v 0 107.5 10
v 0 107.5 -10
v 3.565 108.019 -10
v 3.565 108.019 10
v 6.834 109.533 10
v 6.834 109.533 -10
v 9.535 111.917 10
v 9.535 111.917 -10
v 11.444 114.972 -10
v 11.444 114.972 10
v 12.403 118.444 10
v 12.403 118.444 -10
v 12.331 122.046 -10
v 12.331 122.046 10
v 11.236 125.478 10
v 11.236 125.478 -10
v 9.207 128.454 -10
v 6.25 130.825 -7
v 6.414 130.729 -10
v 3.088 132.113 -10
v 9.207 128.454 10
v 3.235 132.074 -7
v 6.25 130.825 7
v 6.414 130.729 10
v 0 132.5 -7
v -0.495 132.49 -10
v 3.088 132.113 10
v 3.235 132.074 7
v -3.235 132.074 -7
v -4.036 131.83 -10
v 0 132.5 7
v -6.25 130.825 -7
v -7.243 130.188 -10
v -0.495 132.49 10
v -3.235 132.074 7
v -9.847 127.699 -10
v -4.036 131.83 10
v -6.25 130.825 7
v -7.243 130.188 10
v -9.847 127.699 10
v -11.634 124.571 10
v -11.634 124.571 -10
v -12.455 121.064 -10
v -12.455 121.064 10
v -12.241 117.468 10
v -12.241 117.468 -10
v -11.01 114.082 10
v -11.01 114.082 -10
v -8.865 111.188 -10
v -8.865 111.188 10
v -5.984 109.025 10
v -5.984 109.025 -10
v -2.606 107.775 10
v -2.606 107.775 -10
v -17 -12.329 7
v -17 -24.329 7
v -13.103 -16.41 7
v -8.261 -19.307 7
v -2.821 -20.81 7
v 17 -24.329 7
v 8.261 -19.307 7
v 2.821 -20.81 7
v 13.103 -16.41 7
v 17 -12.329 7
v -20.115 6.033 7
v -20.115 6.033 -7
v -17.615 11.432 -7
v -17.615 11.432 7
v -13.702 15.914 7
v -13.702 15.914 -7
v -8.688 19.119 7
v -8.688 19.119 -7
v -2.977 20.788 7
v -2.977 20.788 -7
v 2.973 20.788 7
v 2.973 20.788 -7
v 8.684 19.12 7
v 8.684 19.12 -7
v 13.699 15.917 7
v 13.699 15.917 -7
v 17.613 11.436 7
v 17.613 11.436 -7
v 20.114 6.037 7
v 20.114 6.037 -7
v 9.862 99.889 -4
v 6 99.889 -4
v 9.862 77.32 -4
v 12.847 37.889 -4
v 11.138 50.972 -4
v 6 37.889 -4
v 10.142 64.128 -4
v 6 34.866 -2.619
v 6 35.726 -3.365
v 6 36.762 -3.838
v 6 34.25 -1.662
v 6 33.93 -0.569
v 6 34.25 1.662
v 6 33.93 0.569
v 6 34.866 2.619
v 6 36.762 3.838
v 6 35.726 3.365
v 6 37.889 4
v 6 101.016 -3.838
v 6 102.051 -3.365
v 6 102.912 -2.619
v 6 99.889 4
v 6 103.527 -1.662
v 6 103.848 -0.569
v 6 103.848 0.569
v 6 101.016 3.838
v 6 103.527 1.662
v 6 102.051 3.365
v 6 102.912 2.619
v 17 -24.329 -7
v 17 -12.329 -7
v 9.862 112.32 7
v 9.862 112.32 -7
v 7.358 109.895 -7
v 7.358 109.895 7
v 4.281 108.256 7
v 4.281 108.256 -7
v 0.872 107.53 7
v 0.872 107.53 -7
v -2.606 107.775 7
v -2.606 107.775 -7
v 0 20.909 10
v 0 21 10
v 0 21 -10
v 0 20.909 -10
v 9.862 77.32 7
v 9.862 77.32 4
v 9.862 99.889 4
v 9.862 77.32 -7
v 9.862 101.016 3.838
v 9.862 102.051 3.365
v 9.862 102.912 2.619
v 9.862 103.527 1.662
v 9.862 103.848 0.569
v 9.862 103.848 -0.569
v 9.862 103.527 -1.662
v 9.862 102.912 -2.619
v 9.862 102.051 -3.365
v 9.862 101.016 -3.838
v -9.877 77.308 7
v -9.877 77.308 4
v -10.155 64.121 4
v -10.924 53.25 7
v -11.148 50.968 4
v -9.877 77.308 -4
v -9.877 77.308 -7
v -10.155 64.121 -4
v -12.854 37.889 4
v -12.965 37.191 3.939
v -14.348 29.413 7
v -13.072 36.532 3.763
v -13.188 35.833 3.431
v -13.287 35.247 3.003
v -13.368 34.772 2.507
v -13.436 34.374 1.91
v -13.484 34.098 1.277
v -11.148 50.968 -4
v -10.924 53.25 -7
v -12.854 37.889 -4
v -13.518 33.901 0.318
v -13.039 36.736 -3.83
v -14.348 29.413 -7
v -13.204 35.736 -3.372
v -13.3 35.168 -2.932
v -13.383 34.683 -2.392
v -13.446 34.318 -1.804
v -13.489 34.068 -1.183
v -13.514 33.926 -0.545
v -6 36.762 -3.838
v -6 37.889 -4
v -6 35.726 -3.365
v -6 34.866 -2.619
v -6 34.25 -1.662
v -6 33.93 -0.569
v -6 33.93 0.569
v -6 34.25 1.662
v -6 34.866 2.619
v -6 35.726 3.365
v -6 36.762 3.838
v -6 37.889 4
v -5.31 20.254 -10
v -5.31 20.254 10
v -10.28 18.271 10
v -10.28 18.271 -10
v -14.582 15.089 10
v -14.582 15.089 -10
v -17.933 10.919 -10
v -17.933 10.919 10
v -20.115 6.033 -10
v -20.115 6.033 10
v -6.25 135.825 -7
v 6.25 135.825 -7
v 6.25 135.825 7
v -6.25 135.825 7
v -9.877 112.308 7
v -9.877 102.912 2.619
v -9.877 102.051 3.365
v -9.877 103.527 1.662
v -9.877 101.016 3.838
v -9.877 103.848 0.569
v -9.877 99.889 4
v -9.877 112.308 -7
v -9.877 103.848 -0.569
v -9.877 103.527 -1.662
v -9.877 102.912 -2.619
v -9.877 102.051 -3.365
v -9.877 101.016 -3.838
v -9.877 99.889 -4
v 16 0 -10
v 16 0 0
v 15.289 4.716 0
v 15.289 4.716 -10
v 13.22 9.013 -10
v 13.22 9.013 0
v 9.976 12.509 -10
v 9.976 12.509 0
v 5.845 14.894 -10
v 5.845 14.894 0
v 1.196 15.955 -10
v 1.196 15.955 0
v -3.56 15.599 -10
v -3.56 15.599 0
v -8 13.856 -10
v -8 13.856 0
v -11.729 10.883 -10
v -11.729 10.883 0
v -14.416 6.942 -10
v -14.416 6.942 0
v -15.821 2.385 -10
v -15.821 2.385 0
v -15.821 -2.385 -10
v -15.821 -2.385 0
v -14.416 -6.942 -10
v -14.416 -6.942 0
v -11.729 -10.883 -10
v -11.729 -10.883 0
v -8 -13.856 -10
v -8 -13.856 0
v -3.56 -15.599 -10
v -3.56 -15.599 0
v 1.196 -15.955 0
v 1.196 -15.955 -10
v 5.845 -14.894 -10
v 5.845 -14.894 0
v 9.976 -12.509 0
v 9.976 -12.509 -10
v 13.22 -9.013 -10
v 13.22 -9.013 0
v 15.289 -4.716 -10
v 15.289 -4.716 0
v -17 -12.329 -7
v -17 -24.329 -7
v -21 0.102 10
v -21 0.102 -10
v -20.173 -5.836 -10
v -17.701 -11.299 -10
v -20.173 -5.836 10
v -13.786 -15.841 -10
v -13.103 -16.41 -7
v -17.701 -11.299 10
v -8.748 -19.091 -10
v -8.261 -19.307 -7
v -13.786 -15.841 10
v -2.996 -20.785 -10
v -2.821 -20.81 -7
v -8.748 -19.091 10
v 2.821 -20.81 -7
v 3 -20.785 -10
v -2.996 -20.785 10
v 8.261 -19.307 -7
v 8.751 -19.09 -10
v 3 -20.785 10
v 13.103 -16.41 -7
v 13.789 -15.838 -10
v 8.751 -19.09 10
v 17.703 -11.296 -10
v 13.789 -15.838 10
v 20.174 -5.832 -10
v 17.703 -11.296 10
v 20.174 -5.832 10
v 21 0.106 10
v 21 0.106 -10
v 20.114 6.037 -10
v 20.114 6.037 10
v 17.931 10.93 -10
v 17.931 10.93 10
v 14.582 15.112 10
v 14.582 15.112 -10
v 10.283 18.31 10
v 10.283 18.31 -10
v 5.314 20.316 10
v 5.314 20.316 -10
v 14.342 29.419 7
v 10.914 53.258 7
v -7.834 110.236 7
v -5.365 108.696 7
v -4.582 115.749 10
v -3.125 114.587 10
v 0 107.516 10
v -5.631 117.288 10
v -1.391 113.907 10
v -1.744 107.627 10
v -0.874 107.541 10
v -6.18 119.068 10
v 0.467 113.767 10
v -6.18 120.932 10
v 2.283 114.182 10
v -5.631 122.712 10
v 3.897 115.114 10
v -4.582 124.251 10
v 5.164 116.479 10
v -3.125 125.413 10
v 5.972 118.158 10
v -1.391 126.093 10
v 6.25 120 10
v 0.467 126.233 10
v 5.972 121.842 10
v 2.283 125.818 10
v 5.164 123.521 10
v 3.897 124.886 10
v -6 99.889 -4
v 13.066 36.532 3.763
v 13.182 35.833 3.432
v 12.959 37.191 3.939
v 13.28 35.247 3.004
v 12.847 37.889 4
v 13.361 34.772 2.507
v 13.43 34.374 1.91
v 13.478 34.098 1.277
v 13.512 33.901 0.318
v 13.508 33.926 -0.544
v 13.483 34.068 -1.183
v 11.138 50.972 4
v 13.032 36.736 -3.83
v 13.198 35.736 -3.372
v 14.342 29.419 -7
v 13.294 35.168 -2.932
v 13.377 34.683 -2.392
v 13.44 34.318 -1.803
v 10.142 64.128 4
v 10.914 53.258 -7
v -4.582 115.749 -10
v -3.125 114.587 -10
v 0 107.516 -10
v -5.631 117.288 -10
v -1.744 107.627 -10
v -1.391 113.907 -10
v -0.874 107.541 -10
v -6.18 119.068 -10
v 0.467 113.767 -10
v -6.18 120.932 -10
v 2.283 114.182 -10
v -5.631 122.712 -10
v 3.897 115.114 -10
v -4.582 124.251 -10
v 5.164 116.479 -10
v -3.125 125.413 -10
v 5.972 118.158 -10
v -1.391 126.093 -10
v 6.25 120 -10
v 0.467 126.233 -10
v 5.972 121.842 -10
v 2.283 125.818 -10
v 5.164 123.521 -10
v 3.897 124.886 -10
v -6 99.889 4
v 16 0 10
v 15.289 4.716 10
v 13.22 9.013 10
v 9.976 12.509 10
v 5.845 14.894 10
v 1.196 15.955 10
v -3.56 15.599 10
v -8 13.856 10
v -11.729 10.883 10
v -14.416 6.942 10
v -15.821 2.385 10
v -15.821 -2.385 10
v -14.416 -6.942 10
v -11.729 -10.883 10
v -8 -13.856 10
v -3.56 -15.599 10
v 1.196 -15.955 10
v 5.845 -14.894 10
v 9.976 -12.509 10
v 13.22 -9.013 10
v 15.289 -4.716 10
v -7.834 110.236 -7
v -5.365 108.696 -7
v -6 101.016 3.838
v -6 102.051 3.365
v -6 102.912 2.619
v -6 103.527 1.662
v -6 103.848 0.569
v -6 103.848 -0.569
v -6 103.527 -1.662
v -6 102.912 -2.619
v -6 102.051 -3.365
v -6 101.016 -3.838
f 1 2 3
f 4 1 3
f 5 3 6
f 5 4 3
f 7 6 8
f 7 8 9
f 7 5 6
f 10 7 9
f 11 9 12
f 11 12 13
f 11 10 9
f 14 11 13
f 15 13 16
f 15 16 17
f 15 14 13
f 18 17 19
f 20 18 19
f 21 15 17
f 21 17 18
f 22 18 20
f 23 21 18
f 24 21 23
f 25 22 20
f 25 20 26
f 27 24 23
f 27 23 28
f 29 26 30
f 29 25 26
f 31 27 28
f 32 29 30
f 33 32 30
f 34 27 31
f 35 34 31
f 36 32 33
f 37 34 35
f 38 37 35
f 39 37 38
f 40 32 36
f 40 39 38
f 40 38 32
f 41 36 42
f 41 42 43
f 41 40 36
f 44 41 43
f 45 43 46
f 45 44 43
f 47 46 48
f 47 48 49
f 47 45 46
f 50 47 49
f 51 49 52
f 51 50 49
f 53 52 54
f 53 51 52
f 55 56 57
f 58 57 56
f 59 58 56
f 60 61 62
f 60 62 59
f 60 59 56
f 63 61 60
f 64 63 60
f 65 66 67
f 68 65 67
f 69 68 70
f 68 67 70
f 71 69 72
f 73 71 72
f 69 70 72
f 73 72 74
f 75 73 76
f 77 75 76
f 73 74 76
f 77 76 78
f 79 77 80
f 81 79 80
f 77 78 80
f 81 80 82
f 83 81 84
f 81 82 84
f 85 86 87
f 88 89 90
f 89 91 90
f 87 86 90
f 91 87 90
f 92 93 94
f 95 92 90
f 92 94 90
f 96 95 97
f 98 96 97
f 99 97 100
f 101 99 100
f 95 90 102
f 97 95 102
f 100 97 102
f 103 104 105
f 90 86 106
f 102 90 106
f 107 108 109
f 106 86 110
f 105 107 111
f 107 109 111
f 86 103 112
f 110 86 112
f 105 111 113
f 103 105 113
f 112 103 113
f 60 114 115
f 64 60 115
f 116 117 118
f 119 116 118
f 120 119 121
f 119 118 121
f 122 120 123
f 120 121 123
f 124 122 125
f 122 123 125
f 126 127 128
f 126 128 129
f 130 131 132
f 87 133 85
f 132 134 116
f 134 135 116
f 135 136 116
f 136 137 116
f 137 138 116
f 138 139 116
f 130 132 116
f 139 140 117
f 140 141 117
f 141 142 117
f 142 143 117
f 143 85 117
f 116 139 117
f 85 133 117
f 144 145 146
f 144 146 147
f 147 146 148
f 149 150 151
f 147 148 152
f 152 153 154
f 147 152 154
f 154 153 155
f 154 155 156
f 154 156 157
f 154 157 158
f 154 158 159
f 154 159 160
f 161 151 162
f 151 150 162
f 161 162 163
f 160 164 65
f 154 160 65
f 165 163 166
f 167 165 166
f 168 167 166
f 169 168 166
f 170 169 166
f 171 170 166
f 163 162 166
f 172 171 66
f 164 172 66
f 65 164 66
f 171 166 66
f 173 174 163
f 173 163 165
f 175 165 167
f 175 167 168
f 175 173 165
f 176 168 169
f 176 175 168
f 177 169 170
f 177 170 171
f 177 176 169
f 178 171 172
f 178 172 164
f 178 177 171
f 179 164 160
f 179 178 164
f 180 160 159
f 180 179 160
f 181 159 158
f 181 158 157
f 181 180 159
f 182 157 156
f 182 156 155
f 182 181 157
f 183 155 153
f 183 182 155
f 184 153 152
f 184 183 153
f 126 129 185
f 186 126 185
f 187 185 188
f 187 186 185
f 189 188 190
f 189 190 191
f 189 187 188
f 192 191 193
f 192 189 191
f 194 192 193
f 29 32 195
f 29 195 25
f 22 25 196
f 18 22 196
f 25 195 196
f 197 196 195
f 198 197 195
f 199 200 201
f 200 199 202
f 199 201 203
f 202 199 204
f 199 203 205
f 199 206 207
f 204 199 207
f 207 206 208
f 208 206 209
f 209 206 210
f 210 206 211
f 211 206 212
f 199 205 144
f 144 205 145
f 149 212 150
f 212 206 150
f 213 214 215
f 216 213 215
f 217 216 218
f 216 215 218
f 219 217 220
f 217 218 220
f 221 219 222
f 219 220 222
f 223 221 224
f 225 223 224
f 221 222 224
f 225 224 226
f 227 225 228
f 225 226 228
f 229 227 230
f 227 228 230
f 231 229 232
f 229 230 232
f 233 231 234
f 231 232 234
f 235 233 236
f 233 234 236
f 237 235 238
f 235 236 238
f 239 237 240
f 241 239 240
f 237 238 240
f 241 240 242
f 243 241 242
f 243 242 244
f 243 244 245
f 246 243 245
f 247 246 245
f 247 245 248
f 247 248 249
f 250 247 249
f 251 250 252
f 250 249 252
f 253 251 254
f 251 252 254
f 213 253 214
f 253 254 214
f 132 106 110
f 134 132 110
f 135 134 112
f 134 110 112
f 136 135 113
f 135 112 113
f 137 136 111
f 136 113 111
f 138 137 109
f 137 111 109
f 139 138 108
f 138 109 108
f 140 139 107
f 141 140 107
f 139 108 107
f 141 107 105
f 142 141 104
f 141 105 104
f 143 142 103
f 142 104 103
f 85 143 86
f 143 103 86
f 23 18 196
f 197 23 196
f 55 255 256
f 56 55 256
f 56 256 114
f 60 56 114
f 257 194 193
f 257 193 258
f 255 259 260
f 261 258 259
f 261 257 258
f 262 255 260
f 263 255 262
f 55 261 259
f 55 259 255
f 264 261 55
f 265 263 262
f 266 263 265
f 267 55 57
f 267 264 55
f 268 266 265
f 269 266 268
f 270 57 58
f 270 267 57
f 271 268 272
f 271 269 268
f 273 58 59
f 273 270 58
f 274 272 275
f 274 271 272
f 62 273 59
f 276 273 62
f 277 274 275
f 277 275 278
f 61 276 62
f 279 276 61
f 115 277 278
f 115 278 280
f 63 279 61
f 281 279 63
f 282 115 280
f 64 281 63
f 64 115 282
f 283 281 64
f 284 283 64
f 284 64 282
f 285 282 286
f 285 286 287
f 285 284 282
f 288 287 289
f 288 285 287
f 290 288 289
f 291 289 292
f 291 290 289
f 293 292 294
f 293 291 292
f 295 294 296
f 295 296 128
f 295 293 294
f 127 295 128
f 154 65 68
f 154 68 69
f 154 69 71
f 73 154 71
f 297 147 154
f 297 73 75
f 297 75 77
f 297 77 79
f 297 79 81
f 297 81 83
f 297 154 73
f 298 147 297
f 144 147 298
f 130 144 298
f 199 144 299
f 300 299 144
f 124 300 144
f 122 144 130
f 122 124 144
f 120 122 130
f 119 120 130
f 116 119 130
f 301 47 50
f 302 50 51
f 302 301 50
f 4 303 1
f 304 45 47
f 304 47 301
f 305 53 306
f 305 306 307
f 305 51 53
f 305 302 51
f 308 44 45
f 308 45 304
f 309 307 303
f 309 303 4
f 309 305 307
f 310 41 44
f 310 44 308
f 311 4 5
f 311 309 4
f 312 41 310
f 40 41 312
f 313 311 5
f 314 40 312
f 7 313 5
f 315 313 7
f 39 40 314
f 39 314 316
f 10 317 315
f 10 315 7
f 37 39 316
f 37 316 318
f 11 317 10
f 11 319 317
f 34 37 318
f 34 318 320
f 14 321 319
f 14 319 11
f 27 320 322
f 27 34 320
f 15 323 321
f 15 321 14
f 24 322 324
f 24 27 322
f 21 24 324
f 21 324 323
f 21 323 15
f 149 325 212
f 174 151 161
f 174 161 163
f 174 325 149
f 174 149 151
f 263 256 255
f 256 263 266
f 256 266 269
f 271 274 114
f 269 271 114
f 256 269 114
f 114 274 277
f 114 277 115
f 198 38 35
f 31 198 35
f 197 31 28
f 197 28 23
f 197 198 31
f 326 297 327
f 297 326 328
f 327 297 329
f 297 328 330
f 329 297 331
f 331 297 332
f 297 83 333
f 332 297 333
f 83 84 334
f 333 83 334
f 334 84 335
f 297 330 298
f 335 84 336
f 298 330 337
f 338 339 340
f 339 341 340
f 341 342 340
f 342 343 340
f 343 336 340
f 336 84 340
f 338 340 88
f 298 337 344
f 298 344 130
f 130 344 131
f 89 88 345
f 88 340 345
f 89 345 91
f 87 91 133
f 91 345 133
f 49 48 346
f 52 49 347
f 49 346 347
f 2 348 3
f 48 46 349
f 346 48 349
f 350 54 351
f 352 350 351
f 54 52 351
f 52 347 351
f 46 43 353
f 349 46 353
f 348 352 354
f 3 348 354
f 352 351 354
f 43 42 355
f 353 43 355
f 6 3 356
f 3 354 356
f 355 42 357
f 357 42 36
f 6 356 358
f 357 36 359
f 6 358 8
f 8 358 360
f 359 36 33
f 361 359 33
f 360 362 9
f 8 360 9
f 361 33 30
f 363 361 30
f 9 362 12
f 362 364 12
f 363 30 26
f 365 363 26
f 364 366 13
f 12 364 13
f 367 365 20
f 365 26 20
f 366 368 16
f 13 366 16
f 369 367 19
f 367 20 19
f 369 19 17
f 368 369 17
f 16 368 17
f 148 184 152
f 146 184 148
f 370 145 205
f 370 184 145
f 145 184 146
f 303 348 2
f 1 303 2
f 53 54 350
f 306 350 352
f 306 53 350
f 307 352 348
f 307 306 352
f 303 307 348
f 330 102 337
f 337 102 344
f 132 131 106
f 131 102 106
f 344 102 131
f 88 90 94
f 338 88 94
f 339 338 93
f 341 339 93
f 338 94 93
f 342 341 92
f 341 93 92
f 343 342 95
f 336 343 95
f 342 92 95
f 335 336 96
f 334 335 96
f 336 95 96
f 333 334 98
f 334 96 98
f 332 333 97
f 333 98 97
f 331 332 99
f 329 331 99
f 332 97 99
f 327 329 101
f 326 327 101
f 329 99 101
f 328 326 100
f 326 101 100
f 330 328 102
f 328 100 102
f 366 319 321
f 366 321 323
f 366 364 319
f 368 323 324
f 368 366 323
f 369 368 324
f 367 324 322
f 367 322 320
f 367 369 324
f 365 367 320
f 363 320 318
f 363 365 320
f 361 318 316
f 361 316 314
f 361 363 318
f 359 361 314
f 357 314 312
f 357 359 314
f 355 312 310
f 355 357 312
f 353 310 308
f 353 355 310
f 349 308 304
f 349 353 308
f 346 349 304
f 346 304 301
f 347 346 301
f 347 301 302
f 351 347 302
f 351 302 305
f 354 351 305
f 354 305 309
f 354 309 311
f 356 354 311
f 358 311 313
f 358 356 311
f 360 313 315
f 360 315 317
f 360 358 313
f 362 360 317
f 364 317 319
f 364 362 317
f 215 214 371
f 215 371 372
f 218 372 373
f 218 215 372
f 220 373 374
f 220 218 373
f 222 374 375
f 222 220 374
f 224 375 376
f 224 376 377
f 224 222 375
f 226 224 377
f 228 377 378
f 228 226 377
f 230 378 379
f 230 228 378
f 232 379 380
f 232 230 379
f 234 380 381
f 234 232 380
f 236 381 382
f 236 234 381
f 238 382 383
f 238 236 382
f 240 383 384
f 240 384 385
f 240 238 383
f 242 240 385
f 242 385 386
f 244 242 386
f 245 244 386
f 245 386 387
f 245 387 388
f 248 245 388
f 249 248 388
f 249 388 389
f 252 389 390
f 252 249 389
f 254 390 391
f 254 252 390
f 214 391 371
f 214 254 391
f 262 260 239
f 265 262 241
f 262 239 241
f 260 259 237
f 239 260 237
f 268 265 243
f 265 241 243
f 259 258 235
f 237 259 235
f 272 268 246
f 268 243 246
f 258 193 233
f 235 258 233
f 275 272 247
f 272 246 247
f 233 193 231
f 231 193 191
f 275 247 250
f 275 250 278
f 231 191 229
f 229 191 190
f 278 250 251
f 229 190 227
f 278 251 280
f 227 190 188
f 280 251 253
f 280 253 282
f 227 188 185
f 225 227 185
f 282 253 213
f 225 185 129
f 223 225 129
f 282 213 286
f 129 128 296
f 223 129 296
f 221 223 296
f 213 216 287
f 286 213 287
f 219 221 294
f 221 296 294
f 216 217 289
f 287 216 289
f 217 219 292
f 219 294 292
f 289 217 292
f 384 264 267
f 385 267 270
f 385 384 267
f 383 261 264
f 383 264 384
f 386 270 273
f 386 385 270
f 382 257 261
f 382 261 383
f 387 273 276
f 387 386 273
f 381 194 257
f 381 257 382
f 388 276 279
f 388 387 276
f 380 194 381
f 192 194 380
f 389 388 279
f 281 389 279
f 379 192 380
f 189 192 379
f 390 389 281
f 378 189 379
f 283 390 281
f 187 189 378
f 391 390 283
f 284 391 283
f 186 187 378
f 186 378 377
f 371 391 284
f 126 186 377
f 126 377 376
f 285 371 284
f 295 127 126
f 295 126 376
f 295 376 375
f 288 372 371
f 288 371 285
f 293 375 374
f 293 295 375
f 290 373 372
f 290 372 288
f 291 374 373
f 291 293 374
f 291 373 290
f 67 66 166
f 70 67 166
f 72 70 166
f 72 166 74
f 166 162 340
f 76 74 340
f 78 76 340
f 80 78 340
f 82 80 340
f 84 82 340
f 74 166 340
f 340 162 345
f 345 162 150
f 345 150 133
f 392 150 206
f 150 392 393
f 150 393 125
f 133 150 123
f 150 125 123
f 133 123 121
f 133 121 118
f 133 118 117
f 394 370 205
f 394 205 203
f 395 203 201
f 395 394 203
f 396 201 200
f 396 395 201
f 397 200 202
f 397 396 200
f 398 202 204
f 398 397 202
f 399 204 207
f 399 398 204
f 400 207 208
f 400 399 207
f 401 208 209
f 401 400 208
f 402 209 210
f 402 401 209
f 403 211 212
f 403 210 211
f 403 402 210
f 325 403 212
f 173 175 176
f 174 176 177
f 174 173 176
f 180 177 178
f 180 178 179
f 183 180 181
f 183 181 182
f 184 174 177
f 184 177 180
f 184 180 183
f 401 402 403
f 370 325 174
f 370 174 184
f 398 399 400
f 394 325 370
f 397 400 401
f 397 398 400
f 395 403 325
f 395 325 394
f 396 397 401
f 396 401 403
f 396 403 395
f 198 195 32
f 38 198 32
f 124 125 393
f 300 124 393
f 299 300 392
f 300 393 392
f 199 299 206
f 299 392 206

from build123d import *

# Parameters (mm, degrees)
SKETCH2_R             = 6.25
BOSS_EXTRUDE4_DEPTH   = 10
SKETCH2_R_2           = 16
BOSS_EXTRUDE4_2_DEPTH = 10
BOSS_EXTRUDE5_START   = -7
BOSS_EXTRUDE5_DEPTH   = 14
BOSS_EXTRUDE5_2_DEPTH = 14
BOSS_EXTRUDE5_3_DEPTH = 14
CUT_EXTRUDE1_START    = 6
CUT_EXTRUDE1_DEPTH    = 132.802456026
CUT_EXTRUDE2_START    = -6
CUT_EXTRUDE2_DEPTH    = 132.802456026


# Read off the part's stored shape, not the designer's step: Boss-Extrude5
with BuildPart() as part:
    # Sketch2 → Boss-Extrude4 (new, symmetric)
    with BuildSketch(Plane.XY):
        with BuildLine():
            ThreePointArc((-2.605715405, 107.774606459), (-1.309709439, 107.576199752), (0, 107.515719446))
            Line((0, 107.515719446), (0, 107.5))
            ThreePointArc((0, 107.5), (1.310072658, 132.431158821), (-2.605715405, 107.774606459))
        make_face()
        with Locations((0, 120)):
            Circle(SKETCH2_R, mode=Mode.SUBTRACT)
    extrude(amount=BOSS_EXTRUDE4_DEPTH, both=True)

    # Boss-Extrude5 3 outline → Boss-Extrude5 3 (add)
    with BuildSketch(Plane.XY.offset(BOSS_EXTRUDE5_START)):
        with BuildLine():
            ThreePointArc((-6.25, 130.825317548), (0, 132.5), (6.25, 130.825317547))
            Line((6.25, 130.825317547), (6.25, 135.825317547))
            Line((6.25, 135.825317547), (-6.25, 135.825317547))
            Line((-6.25, 135.825317547), (-6.25, 130.825317548))
        make_face()
    extrude(amount=BOSS_EXTRUDE5_3_DEPTH)


with BuildPart() as body_2:
    # Sketch2 → Boss-Extrude4 2 (new, symmetric)
    with BuildSketch(Plane.XY):
        with BuildLine():
            ThreePointArc((20.113639143, 6.036681242), (12.534546141, 16.848891745), (0, 21))
            Line((0, 21), (0, 20.909399801))
            ThreePointArc((0, 20.909399801), (-12.533149824, 16.818613073), (-20.114793765, 6.032832817))
            ThreePointArc((-20.114793765, 6.032832817), (0.002008951, -20.999999904), (20.113639143, 6.036681242))
        make_face()
        Circle(SKETCH2_R_2, mode=Mode.SUBTRACT)
    extrude(amount=BOSS_EXTRUDE4_2_DEPTH, both=True)

    # Boss-Extrude5 2 outline → Boss-Extrude5 2 (add)
    with BuildSketch(Plane.XY.offset(BOSS_EXTRUDE5_START)):
        with BuildLine():
            Line((-17, -12.328828006), (-17, -24.328828006))
            Line((-17, -24.328828006), (17, -24.328828006))
            Line((17, -24.328828006), (17, -12.328828006))
            ThreePointArc((17, -12.328828006), (0, -21), (-17, -12.328828006))
        make_face()
    extrude(amount=BOSS_EXTRUDE5_2_DEPTH)


with BuildPart() as body_3:
    # Boss-Extrude5 outline → Boss-Extrude5 (new body)
    with BuildSketch(Plane.XY.offset(BOSS_EXTRUDE5_START)):
        with BuildLine():
            ThreePointArc((-9.876894189, 77.308172187), (-12.340920148, 41.289152602), (-20.114793765, 6.032832817))
            ThreePointArc((-20.114793765, 6.032832817), (-0.002008951, 20.999999904), (20.113639143, 6.036681242))
            ThreePointArc((20.113639143, 6.036681242), (12.332337725, 41.296257714), (9.862159173, 77.319647375))
            Line((9.862159173, 77.319647375), (9.862159173, 112.319647375))
            ThreePointArc((9.862159173, 112.319647375), (4.281161439, 108.25599486), (-2.605715405, 107.774606459))
            ThreePointArc((-2.605715405, 107.774606459), (-6.645276389, 109.393477757), (-9.876894189, 112.308172187))
            Line((-9.876894189, 112.308172187), (-9.876894189, 77.308172187))
        make_face()
    extrude(amount=BOSS_EXTRUDE5_DEPTH)

    # Sketch3 → Cut-Extrude1 (cut, through all)
    with BuildSketch(Plane(origin=(0, 0, 0), x_dir=(0, 0, -1), z_dir=(1, 0, 0)).offset(CUT_EXTRUDE1_START)):
        with BuildLine():
            Line((4, 99.888786358), (4, 37.888786358))
            ThreePointArc((4, 37.888786358), (0, 33.888786358), (-4, 37.888786358))
            Line((-4, 37.888786358), (-4, 99.888786358))
            ThreePointArc((-4, 99.888786358), (0, 103.888786358), (4, 99.888786358))
        make_face()
    extrude(amount=CUT_EXTRUDE1_DEPTH, mode=Mode.SUBTRACT)

    # Sketch3<2> → Cut-Extrude2 (cut, through all)
    with BuildSketch(Plane(origin=(0, 0, 0), x_dir=(0, 0, -1), z_dir=(1, 0, 0)).offset(CUT_EXTRUDE2_START)):
        with BuildLine():
            Line((4, 99.888786358), (4, 37.888786358))
            ThreePointArc((4, 37.888786358), (0, 33.888786358), (-4, 37.888786358))
            Line((-4, 37.888786358), (-4, 99.888786358))
            ThreePointArc((-4, 99.888786358), (0, 103.888786358), (4, 99.888786358))
        make_face()
    extrude(amount=-CUT_EXTRUDE2_DEPTH, mode=Mode.SUBTRACT)


solid = Compound([part.part, body_2.part, body_3.part])
